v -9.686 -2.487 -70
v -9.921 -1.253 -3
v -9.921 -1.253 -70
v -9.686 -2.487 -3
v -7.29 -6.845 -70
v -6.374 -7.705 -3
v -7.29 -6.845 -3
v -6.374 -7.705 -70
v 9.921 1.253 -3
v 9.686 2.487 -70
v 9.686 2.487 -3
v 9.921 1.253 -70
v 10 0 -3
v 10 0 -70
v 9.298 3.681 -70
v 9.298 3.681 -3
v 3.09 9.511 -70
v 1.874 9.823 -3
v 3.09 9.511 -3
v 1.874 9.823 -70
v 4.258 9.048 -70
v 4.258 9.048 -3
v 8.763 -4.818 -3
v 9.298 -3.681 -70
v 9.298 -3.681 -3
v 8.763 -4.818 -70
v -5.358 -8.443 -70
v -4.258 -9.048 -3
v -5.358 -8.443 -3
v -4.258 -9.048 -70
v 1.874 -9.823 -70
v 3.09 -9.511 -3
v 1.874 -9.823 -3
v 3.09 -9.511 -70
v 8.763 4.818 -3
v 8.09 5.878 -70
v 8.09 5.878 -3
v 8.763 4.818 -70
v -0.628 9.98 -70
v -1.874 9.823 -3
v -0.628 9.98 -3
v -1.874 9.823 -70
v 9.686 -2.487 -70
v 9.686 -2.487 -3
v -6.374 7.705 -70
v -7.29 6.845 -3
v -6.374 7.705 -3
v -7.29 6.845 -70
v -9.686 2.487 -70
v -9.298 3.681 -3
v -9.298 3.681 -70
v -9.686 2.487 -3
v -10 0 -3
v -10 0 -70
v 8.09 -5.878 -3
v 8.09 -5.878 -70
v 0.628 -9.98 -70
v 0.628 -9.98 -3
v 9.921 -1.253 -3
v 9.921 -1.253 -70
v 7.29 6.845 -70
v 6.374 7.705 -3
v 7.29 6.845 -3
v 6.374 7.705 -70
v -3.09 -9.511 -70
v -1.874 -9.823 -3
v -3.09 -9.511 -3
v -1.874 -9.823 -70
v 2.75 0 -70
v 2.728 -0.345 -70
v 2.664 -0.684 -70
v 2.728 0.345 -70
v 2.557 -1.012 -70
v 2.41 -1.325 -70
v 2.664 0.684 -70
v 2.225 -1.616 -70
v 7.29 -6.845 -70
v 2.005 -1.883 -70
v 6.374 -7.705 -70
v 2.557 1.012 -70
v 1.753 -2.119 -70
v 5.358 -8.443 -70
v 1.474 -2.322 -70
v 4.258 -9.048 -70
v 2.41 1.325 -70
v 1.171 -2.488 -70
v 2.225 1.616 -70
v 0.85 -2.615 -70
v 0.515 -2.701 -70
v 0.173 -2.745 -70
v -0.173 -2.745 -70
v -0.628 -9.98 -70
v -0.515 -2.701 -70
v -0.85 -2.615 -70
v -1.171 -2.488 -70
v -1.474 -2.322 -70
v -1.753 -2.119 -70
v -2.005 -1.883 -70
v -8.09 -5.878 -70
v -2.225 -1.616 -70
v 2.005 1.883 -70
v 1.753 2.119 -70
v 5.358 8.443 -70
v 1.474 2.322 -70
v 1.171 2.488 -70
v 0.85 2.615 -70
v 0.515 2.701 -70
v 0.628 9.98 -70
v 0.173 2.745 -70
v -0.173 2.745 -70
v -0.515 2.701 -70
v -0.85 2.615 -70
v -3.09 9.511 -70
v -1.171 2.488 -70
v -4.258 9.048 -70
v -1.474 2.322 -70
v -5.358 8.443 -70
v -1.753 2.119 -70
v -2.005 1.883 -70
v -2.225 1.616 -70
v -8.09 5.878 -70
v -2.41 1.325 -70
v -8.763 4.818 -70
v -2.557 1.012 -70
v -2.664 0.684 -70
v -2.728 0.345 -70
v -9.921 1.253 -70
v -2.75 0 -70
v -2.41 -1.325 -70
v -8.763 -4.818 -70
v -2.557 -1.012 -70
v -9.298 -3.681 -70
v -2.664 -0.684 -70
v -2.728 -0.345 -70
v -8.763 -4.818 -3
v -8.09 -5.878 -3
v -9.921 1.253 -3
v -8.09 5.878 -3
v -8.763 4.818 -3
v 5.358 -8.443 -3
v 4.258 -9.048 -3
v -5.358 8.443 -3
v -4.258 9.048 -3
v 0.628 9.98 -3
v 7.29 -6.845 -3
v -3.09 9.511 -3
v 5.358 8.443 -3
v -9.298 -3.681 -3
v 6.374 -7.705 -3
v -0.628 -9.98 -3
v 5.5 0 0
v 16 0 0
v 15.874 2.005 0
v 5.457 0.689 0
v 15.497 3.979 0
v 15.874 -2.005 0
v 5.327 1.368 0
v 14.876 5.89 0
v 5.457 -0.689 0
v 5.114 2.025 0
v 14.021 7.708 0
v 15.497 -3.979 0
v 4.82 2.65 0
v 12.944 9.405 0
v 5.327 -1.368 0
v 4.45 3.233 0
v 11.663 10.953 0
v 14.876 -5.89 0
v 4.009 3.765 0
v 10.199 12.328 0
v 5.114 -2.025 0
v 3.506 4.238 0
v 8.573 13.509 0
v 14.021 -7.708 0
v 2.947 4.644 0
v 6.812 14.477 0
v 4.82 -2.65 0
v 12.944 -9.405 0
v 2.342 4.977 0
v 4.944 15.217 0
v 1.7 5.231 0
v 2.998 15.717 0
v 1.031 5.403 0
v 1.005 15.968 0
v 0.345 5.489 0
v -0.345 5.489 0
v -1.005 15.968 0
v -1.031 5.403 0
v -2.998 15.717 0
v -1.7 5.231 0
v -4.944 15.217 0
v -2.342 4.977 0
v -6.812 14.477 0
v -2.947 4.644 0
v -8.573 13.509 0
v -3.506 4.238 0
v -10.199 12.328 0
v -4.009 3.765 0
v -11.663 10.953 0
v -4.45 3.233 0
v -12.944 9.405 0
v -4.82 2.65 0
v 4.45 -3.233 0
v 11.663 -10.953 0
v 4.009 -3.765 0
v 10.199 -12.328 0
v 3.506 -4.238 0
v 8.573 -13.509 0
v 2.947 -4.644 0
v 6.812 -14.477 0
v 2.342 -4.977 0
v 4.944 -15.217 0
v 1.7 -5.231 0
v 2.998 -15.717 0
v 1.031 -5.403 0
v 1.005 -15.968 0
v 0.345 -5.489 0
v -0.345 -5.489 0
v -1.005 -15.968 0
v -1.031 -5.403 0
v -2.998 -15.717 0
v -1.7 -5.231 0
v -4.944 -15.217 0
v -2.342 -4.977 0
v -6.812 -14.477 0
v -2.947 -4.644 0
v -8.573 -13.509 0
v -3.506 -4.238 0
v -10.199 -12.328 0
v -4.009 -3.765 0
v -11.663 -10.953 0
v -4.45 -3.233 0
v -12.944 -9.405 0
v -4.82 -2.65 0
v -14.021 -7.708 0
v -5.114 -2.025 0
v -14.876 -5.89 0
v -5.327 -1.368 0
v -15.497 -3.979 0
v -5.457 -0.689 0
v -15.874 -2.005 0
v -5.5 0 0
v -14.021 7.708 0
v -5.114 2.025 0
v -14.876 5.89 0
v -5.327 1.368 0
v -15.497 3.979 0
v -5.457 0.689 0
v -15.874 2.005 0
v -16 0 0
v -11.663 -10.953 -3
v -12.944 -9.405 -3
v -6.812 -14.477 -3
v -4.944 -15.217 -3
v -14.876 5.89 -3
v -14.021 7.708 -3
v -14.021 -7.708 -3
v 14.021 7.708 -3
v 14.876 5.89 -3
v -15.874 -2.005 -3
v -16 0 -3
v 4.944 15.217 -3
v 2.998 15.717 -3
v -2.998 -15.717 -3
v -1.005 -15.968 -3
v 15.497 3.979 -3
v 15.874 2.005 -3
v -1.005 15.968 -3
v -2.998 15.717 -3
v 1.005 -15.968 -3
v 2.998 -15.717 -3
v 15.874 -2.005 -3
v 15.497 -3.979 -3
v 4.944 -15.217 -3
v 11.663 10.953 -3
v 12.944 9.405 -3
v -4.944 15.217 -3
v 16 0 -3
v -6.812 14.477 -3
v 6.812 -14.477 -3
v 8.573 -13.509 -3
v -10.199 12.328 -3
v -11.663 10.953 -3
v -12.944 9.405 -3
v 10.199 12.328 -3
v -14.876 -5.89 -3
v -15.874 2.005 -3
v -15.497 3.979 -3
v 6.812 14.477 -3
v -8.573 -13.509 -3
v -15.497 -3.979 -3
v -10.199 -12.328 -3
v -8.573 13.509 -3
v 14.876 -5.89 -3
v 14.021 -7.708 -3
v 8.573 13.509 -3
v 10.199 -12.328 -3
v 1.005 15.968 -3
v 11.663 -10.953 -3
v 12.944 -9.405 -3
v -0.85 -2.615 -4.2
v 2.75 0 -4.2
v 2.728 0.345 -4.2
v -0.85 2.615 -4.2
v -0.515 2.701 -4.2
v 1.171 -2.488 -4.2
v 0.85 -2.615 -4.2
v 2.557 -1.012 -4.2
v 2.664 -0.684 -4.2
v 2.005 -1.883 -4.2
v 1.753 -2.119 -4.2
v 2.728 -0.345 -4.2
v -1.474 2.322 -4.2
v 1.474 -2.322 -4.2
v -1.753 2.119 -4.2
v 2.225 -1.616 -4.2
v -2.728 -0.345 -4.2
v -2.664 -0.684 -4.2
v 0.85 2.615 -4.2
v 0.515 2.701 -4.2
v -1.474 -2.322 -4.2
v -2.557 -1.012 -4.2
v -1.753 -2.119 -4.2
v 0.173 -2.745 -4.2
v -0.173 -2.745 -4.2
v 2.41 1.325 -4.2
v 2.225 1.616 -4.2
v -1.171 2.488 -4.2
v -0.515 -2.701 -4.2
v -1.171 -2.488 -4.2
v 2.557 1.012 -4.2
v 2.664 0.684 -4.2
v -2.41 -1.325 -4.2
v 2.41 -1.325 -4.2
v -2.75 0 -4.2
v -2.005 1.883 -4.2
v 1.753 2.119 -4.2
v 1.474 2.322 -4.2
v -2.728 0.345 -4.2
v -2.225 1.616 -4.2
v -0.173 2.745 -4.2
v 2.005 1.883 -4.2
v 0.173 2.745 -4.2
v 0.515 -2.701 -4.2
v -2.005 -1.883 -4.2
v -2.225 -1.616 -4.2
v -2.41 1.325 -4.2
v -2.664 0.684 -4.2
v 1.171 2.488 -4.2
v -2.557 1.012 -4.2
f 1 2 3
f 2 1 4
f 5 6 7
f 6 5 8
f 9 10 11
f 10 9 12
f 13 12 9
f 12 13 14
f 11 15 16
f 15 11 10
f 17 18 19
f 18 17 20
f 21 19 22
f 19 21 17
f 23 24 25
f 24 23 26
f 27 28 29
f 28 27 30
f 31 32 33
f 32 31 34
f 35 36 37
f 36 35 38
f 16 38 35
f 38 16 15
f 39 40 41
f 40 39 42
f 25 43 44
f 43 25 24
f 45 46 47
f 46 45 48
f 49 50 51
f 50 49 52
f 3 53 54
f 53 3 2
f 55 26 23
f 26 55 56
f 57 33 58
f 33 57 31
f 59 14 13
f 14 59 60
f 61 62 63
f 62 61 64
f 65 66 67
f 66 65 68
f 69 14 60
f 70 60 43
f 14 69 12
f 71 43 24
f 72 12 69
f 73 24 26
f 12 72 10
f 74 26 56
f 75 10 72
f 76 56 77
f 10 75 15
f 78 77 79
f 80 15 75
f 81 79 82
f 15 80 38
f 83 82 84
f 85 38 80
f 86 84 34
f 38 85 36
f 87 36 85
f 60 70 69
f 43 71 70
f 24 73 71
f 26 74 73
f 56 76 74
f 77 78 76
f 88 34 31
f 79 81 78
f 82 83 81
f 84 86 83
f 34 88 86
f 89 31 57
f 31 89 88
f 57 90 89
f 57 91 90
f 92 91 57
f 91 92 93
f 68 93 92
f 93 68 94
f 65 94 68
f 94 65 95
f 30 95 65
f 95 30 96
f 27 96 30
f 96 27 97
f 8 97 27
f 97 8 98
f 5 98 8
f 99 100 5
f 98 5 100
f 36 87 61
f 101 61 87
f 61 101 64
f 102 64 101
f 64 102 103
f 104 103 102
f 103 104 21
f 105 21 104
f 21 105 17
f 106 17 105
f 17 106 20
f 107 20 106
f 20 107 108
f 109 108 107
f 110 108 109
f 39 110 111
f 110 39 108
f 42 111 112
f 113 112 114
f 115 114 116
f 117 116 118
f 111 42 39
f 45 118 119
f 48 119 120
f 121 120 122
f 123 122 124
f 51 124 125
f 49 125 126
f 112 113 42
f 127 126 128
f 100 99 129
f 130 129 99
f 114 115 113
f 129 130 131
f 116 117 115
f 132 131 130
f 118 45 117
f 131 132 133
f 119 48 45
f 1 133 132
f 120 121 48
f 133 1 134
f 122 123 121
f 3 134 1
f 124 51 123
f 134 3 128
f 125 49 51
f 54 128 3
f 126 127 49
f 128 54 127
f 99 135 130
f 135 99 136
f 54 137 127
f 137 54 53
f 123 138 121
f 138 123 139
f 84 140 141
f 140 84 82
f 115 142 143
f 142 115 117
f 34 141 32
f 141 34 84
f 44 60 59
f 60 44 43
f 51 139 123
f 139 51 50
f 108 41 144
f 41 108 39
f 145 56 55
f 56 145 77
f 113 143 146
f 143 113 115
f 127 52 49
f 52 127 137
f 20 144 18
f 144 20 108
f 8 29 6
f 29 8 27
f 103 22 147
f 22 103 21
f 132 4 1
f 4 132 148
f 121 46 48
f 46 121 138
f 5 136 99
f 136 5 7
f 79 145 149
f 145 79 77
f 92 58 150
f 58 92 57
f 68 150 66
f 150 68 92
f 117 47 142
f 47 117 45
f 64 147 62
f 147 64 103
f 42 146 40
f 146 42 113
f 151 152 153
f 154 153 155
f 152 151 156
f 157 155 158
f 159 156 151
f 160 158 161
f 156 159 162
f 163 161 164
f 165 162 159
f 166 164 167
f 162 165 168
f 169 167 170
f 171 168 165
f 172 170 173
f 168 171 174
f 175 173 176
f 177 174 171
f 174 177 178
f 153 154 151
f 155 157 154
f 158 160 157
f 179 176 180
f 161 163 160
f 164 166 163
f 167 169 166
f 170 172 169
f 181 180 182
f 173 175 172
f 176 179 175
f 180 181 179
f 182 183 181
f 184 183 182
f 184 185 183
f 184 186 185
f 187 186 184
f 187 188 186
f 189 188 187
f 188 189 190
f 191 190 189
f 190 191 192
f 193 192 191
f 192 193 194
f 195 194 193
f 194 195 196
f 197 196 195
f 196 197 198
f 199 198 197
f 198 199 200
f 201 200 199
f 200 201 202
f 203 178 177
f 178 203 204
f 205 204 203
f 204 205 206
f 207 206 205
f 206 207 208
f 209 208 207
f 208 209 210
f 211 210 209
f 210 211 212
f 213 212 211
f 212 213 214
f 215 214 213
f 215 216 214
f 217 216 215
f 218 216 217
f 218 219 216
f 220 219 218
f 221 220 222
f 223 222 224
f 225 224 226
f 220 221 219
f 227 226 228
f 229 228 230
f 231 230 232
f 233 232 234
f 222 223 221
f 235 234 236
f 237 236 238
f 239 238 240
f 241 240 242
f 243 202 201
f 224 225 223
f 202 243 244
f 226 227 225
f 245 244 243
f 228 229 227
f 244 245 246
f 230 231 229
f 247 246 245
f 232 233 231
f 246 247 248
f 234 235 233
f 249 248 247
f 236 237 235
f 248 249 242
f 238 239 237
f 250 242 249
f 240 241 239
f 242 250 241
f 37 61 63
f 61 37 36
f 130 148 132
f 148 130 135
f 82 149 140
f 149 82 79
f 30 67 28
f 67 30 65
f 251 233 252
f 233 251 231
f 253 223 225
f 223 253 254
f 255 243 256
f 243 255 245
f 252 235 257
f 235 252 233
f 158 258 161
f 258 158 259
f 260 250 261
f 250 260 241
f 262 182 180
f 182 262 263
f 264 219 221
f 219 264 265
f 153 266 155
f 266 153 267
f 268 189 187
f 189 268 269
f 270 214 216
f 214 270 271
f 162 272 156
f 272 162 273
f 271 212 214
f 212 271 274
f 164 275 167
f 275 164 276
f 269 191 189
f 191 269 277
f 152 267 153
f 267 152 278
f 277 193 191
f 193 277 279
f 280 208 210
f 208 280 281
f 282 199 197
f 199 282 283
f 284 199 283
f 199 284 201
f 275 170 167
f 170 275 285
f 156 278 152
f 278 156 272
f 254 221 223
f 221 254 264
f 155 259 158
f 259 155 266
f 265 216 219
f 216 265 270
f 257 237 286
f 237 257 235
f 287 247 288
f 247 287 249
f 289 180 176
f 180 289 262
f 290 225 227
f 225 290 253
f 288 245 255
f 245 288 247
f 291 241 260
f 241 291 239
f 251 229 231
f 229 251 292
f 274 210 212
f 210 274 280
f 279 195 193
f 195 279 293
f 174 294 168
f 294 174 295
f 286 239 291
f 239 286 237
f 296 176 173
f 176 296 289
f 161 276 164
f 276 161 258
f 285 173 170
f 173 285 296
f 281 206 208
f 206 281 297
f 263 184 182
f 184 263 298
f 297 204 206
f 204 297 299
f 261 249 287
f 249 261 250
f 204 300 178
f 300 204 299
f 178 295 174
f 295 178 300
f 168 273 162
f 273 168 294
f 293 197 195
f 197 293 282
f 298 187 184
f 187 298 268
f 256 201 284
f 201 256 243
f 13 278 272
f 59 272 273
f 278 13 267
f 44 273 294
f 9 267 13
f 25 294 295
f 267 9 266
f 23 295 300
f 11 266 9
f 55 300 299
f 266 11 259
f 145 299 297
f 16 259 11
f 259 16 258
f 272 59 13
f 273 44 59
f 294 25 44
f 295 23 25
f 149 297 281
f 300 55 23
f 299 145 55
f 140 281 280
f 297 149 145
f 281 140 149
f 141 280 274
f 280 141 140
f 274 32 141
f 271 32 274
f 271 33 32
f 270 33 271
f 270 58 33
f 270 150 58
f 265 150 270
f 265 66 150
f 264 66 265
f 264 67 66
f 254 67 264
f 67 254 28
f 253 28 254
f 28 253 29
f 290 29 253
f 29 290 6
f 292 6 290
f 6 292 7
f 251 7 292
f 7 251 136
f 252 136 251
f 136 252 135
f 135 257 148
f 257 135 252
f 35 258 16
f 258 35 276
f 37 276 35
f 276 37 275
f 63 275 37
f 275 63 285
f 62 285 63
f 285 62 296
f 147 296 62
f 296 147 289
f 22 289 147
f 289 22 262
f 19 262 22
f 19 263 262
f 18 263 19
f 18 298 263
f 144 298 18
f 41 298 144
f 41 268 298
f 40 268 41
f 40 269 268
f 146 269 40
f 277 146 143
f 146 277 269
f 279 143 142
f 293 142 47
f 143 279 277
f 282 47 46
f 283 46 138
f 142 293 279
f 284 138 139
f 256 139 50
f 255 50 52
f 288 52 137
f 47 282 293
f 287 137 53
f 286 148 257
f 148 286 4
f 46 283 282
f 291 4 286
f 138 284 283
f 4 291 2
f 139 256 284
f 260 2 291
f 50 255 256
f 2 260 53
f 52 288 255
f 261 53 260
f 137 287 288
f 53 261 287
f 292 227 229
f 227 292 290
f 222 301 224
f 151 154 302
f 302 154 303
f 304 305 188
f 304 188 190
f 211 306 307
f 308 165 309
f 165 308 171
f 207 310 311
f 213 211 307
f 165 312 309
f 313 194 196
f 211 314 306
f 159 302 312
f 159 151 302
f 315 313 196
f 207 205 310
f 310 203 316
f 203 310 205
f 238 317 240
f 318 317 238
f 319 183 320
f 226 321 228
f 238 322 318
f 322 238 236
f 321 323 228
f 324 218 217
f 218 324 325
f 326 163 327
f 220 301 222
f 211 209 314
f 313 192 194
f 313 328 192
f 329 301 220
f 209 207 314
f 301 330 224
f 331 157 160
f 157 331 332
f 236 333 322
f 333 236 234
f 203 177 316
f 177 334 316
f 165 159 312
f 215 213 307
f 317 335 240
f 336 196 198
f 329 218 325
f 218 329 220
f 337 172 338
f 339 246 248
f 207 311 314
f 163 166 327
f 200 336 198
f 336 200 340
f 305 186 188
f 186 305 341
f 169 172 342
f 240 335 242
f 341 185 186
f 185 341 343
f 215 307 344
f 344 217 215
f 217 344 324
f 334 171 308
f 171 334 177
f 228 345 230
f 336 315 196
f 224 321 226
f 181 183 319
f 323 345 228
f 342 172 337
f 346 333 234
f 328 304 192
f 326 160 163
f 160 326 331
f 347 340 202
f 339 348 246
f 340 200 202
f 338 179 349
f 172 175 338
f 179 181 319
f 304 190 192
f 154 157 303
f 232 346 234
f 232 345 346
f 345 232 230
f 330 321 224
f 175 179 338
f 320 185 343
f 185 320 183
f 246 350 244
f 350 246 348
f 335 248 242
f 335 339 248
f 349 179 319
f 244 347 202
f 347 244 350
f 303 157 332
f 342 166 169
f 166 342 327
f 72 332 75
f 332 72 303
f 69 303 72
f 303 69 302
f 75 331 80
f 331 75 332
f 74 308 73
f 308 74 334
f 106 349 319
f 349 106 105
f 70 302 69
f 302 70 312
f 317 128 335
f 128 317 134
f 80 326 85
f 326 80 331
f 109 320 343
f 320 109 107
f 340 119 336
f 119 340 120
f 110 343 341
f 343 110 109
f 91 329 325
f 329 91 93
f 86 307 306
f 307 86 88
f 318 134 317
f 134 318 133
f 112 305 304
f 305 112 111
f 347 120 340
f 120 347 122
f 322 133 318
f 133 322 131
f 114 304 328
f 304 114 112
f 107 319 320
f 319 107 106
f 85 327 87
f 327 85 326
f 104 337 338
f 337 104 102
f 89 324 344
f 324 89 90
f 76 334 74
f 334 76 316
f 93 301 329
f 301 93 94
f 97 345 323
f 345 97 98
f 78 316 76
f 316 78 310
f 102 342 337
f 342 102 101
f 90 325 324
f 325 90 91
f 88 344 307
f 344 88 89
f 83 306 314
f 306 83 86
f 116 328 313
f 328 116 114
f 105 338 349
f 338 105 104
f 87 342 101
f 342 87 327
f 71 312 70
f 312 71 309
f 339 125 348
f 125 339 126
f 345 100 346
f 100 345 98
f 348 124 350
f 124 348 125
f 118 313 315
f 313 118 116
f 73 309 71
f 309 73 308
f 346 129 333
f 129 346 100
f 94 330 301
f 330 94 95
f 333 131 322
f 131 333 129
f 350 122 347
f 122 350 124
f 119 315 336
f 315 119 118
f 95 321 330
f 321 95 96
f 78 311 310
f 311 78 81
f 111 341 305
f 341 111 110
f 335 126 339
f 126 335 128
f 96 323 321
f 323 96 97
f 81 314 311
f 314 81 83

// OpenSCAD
$fn = 50;


difference() {
	union() {
		translate(v = [0, 0, -70.0000000000]) {
			cylinder(h = 70, r = 10.0000000000);
		}
		translate(v = [0, 0, -3.0000000000]) {
			cylinder(h = 3, r = 16.0000000000);
		}
	}
	union() {
		translate(v = [0, 0, 0]) {
			rotate(a = [0, 0, 0]) {
				difference() {
					union() {
						#translate(v = [0, 0, -70.0000000000]) {
							cylinder(h = 70, r = 2.2500000000);
						}
						#translate(v = [0, 0, -4.2000000000]) {
							cylinder(h = 4.2000000000, r1 = 2.7500000000, r2 = 5.5000000000);
						}
						#translate(v = [0, 0, -70.0000000000]) {
							cylinder(h = 70, r = 2.7500000000);
						}
						#translate(v = [0, 0, -70.0000000000]) {
							cylinder(h = 70, r = 2.2500000000);
						}
					}
					union();
				}
			}
		}
	}
}
